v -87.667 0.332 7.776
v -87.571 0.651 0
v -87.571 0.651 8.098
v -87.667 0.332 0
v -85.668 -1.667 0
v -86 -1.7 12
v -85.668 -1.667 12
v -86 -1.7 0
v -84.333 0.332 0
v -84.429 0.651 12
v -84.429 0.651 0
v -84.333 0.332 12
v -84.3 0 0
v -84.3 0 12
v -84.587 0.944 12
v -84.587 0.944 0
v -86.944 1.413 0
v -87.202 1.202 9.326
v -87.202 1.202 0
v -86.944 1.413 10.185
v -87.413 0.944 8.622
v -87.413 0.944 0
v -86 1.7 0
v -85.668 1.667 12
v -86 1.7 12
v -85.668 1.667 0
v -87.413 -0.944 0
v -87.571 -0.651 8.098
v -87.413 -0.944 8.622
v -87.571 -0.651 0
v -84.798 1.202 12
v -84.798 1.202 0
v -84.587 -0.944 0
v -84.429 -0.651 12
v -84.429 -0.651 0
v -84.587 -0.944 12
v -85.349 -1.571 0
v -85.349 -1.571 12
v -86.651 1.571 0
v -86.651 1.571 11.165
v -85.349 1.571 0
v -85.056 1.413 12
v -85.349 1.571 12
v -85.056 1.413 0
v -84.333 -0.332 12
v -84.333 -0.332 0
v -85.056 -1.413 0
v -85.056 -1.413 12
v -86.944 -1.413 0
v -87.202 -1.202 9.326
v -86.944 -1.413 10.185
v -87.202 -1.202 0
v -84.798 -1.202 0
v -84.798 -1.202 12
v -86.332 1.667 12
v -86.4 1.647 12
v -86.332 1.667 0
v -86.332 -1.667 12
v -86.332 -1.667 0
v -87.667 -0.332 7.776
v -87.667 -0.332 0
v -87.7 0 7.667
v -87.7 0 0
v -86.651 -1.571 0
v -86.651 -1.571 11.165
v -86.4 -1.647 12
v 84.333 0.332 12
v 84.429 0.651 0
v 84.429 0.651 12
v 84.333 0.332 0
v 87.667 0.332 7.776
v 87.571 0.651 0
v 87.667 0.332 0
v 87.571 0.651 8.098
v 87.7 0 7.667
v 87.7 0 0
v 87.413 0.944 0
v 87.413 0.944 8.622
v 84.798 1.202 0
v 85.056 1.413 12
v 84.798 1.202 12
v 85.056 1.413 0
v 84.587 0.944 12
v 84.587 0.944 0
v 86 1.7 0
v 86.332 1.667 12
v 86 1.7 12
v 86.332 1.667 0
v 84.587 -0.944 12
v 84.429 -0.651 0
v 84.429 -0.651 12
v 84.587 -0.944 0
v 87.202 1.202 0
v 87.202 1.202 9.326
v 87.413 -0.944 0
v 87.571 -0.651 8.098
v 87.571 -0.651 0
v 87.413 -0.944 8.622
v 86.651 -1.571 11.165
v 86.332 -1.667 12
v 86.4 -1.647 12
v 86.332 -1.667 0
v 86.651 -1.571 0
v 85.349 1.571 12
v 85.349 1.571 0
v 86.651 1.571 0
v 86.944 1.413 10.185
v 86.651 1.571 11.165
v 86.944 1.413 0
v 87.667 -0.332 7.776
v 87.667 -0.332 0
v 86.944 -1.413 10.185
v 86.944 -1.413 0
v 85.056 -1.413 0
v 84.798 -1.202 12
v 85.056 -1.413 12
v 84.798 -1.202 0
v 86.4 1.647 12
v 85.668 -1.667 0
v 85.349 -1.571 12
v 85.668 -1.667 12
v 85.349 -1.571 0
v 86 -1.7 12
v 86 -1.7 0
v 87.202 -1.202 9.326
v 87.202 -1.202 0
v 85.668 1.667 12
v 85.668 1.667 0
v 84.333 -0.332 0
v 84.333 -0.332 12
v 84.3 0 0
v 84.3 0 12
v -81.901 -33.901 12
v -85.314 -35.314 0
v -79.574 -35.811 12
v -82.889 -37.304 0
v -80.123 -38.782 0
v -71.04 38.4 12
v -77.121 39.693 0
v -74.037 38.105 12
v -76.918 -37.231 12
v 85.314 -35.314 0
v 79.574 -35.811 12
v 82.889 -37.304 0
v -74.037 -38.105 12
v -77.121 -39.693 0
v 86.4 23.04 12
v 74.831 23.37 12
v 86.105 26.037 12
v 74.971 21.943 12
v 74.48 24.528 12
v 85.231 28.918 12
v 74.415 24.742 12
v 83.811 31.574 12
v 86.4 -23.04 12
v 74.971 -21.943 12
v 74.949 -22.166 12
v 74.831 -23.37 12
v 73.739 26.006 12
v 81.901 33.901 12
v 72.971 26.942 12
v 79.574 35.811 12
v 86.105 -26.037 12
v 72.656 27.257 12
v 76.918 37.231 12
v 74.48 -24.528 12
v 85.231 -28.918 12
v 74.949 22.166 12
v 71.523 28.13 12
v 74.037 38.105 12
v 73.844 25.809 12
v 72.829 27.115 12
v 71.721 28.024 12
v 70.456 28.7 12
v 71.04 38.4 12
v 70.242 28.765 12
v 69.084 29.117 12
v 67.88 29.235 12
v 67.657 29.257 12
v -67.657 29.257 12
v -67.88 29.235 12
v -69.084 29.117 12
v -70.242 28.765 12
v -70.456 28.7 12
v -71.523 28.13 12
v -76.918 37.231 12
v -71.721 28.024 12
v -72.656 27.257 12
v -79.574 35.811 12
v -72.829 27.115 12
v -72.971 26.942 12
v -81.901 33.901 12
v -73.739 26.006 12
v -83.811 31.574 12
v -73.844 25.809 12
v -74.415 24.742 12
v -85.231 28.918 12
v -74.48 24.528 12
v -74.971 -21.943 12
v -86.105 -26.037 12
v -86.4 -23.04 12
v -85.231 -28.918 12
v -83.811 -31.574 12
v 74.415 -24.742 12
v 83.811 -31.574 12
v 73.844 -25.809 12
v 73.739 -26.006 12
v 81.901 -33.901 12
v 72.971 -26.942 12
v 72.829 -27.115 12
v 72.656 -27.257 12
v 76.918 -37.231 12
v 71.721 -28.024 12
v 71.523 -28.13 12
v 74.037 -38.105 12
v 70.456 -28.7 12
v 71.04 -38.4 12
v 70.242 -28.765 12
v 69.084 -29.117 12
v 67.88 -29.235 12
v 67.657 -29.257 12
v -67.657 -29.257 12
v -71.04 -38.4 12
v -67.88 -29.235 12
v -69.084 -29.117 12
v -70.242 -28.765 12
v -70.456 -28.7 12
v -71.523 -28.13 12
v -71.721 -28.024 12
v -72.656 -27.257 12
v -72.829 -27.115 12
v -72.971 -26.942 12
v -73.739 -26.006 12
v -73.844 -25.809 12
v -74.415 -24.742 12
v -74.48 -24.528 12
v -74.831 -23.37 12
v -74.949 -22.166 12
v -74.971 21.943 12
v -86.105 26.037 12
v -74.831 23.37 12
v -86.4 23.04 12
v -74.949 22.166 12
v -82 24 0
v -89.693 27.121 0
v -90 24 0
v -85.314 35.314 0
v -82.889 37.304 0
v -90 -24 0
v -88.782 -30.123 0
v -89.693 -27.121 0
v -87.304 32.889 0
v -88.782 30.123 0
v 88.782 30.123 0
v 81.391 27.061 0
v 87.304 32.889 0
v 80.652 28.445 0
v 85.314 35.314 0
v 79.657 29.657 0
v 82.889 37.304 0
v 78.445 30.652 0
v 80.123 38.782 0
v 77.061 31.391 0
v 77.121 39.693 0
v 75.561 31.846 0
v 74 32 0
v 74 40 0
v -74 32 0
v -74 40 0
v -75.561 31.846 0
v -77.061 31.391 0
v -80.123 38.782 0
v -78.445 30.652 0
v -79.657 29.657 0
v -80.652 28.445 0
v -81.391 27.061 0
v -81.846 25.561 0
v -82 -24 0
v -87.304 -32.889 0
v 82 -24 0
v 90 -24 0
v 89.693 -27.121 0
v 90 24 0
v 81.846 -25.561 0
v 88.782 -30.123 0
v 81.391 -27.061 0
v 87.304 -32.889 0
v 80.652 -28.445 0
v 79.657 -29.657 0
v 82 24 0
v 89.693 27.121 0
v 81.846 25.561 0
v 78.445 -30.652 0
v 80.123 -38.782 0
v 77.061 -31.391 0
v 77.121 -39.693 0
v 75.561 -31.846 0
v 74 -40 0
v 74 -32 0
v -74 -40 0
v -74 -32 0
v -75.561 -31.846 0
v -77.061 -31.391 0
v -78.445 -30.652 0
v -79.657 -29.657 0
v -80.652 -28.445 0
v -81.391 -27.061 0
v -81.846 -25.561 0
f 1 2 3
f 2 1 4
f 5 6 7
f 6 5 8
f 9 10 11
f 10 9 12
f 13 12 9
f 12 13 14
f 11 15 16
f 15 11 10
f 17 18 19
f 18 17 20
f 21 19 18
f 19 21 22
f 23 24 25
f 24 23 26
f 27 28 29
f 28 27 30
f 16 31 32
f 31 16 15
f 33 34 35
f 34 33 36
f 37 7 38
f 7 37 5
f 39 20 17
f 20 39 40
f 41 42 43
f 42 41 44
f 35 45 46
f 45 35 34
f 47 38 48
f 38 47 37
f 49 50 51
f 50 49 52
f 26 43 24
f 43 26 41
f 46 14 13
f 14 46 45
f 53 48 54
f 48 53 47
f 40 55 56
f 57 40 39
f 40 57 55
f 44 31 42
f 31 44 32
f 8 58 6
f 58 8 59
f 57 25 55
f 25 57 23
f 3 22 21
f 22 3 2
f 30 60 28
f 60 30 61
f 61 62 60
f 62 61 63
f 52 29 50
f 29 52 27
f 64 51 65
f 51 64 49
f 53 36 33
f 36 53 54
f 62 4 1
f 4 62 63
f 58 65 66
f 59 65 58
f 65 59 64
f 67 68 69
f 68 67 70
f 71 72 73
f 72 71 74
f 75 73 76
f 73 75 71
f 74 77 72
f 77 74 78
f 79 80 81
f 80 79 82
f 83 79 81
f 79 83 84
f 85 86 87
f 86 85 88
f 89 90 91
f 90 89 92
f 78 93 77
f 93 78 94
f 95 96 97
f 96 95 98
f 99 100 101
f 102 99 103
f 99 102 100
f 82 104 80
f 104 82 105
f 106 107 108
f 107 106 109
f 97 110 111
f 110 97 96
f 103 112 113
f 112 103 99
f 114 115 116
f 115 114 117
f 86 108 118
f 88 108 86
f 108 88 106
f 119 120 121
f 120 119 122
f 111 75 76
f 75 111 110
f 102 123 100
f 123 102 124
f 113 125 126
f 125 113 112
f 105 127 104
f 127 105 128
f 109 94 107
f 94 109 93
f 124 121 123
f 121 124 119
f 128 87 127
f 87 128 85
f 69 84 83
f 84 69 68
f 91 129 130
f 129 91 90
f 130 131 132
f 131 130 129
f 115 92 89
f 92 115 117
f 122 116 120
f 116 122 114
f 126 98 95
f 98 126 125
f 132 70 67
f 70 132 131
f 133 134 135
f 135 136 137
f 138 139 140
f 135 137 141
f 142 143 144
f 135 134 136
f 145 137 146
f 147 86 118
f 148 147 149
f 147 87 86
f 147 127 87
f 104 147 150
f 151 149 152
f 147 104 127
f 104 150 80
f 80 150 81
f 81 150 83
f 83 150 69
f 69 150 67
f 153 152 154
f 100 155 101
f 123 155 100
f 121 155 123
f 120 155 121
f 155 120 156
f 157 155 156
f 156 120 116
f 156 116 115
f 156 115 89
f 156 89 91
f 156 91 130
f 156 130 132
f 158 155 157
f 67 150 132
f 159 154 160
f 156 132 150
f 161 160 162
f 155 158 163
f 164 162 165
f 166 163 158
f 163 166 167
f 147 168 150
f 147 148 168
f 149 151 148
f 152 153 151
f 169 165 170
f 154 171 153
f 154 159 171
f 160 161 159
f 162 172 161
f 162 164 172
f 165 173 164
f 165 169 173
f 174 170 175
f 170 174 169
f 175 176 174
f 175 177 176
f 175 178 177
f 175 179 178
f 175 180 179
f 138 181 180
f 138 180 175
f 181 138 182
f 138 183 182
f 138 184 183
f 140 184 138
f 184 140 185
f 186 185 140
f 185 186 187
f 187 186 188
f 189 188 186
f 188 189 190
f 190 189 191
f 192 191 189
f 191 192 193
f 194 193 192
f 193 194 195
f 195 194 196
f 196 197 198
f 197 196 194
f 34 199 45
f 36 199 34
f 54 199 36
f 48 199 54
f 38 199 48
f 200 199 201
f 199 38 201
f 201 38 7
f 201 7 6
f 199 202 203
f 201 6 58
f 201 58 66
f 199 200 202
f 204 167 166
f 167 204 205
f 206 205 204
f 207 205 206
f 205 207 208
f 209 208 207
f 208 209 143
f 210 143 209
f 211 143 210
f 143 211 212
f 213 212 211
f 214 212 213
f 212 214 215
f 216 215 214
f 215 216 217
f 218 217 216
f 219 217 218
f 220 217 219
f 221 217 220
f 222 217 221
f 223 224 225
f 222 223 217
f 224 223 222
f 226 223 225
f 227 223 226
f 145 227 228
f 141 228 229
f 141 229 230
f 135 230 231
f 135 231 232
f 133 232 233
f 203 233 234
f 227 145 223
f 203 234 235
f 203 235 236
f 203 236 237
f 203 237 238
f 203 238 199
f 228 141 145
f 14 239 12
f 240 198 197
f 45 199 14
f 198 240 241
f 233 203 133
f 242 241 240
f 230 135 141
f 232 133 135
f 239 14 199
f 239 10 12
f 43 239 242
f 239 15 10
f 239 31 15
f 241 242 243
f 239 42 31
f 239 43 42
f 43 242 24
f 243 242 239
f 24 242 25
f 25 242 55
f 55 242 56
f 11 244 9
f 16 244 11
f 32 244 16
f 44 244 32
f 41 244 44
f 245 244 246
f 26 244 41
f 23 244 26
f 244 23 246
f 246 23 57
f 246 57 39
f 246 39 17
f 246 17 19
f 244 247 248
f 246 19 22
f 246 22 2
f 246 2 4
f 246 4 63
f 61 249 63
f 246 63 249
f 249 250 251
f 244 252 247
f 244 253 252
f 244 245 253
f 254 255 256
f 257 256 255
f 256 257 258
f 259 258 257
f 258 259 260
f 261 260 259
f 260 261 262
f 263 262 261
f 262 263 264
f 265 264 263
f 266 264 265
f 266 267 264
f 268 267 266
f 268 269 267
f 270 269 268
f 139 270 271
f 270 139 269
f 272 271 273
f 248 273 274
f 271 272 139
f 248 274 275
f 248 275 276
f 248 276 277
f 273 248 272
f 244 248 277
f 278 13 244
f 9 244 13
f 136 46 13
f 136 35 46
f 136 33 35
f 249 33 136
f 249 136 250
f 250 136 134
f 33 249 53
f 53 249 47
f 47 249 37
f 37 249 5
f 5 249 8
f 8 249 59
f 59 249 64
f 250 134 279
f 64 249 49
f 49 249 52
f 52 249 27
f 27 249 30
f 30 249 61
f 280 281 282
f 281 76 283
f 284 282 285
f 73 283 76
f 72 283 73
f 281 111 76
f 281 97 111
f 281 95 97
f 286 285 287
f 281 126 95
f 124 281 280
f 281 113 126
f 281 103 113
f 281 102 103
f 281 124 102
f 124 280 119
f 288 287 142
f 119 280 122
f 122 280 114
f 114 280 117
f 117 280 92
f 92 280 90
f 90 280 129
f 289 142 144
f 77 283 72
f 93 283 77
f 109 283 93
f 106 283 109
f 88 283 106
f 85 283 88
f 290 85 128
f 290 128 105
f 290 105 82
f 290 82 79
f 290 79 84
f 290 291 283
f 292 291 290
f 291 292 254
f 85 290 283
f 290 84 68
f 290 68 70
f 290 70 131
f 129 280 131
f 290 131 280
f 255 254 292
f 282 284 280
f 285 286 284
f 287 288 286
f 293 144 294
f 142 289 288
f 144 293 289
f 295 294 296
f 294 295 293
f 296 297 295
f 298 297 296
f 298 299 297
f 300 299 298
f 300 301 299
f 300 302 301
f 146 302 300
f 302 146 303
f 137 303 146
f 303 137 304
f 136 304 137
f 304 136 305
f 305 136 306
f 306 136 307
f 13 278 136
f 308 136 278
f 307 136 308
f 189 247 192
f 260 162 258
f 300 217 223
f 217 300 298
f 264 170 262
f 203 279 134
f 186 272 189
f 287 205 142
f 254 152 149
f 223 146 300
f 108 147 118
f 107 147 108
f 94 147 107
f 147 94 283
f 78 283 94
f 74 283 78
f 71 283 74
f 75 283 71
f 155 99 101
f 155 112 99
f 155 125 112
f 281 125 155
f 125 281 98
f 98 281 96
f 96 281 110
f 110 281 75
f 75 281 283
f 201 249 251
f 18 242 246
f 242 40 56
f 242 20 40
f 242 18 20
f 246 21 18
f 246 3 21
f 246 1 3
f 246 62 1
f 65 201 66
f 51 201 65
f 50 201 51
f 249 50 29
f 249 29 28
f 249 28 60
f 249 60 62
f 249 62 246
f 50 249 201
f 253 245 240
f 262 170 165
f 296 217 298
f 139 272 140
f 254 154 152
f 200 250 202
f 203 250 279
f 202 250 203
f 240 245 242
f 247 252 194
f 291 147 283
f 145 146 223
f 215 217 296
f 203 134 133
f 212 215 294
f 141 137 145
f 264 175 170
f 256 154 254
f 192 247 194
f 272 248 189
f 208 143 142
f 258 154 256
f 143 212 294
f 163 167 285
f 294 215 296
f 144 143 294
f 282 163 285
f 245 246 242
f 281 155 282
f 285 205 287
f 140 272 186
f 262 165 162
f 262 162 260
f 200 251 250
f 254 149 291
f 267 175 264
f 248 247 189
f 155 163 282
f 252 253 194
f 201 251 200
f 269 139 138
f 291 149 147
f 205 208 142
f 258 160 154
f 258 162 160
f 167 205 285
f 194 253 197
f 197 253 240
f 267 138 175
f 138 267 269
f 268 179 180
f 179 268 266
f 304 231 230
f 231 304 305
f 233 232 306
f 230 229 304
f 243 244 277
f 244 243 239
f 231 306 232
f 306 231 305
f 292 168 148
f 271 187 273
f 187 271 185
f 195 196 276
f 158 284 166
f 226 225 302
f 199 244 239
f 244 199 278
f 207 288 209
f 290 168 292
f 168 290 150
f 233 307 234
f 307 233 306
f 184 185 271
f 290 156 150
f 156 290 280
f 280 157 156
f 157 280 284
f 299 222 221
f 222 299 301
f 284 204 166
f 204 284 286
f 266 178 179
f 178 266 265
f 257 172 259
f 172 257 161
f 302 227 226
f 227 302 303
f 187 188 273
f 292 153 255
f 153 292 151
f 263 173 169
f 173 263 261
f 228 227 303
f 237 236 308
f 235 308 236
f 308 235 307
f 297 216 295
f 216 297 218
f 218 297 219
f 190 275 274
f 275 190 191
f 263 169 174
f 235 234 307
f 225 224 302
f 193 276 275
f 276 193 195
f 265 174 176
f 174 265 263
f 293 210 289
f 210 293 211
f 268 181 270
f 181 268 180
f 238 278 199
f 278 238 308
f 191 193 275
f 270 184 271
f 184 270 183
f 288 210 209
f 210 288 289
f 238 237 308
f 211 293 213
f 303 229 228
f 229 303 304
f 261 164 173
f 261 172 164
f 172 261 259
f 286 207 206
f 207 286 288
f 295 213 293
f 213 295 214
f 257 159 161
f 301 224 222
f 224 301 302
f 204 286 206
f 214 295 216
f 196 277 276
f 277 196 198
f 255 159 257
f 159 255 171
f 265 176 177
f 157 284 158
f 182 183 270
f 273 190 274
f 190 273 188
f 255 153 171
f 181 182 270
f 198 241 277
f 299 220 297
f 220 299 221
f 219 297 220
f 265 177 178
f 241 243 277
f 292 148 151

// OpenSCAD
$fn = 32;

// ----------------------------------------------------------------------
// Display bezel: 180 x 80 mm frame, opening 164x64 mm
// ----------------------------------------------------------------------

// --- parameters (mm) ---
length = 180;             // frame outside length, X
width = 80;               // frame outside width, Y
frame_w = 8;              // frame width
thickness = 12;           // frame thickness
corner_r = 16;            // outside corner radius
chamfer = 0.96;           // outer wall taper
funnel = 0.9;             // inner opening taper
opening_l = 164;          // opening length
opening_w = 64;           // opening width
inner_r = 8;              // opening corner radius
hole_d = 3.4;             // mounting screw clearance
holes_per_side = 1;       // holes per short side
hole_inset = 4;           // hole centre inset from the outside edge

/* rounded-rectangle outlines, generated with loops */
module rounded_ring(l_nom, w_nom, r) {
  hull() {
    for (sx = [-1, 1]) for (sy = [-1, 1])
      translate([sx * (l_nom / 2 - r), sy * (w_nom / 2 - r)]) circle(r = r);
  }
}

difference() {
  /* frame body, drafted so the outer edge is a variable-depth chamfer */
  linear_extrude(height = thickness, scale = chamfer)
    rounded_ring(length, width, corner_r);
  /* viewing opening, drafted the other way for a funnel edge */
  linear_extrude(height = thickness + 2, scale = funnel)
    translate([0, 0, -1]) rounded_ring(opening_l, opening_w, inner_r);
  /* mounting screws through the frame lands */
  for (sx = [-1, 1]) for (i = [1 : holes_per_side])
    translate([sx * (length / 2 - hole_inset),
               (i - (holes_per_side + 1) / 2) * width * 0.5, -1])
      cylinder(h = thickness + 2, d = hole_d);
}
